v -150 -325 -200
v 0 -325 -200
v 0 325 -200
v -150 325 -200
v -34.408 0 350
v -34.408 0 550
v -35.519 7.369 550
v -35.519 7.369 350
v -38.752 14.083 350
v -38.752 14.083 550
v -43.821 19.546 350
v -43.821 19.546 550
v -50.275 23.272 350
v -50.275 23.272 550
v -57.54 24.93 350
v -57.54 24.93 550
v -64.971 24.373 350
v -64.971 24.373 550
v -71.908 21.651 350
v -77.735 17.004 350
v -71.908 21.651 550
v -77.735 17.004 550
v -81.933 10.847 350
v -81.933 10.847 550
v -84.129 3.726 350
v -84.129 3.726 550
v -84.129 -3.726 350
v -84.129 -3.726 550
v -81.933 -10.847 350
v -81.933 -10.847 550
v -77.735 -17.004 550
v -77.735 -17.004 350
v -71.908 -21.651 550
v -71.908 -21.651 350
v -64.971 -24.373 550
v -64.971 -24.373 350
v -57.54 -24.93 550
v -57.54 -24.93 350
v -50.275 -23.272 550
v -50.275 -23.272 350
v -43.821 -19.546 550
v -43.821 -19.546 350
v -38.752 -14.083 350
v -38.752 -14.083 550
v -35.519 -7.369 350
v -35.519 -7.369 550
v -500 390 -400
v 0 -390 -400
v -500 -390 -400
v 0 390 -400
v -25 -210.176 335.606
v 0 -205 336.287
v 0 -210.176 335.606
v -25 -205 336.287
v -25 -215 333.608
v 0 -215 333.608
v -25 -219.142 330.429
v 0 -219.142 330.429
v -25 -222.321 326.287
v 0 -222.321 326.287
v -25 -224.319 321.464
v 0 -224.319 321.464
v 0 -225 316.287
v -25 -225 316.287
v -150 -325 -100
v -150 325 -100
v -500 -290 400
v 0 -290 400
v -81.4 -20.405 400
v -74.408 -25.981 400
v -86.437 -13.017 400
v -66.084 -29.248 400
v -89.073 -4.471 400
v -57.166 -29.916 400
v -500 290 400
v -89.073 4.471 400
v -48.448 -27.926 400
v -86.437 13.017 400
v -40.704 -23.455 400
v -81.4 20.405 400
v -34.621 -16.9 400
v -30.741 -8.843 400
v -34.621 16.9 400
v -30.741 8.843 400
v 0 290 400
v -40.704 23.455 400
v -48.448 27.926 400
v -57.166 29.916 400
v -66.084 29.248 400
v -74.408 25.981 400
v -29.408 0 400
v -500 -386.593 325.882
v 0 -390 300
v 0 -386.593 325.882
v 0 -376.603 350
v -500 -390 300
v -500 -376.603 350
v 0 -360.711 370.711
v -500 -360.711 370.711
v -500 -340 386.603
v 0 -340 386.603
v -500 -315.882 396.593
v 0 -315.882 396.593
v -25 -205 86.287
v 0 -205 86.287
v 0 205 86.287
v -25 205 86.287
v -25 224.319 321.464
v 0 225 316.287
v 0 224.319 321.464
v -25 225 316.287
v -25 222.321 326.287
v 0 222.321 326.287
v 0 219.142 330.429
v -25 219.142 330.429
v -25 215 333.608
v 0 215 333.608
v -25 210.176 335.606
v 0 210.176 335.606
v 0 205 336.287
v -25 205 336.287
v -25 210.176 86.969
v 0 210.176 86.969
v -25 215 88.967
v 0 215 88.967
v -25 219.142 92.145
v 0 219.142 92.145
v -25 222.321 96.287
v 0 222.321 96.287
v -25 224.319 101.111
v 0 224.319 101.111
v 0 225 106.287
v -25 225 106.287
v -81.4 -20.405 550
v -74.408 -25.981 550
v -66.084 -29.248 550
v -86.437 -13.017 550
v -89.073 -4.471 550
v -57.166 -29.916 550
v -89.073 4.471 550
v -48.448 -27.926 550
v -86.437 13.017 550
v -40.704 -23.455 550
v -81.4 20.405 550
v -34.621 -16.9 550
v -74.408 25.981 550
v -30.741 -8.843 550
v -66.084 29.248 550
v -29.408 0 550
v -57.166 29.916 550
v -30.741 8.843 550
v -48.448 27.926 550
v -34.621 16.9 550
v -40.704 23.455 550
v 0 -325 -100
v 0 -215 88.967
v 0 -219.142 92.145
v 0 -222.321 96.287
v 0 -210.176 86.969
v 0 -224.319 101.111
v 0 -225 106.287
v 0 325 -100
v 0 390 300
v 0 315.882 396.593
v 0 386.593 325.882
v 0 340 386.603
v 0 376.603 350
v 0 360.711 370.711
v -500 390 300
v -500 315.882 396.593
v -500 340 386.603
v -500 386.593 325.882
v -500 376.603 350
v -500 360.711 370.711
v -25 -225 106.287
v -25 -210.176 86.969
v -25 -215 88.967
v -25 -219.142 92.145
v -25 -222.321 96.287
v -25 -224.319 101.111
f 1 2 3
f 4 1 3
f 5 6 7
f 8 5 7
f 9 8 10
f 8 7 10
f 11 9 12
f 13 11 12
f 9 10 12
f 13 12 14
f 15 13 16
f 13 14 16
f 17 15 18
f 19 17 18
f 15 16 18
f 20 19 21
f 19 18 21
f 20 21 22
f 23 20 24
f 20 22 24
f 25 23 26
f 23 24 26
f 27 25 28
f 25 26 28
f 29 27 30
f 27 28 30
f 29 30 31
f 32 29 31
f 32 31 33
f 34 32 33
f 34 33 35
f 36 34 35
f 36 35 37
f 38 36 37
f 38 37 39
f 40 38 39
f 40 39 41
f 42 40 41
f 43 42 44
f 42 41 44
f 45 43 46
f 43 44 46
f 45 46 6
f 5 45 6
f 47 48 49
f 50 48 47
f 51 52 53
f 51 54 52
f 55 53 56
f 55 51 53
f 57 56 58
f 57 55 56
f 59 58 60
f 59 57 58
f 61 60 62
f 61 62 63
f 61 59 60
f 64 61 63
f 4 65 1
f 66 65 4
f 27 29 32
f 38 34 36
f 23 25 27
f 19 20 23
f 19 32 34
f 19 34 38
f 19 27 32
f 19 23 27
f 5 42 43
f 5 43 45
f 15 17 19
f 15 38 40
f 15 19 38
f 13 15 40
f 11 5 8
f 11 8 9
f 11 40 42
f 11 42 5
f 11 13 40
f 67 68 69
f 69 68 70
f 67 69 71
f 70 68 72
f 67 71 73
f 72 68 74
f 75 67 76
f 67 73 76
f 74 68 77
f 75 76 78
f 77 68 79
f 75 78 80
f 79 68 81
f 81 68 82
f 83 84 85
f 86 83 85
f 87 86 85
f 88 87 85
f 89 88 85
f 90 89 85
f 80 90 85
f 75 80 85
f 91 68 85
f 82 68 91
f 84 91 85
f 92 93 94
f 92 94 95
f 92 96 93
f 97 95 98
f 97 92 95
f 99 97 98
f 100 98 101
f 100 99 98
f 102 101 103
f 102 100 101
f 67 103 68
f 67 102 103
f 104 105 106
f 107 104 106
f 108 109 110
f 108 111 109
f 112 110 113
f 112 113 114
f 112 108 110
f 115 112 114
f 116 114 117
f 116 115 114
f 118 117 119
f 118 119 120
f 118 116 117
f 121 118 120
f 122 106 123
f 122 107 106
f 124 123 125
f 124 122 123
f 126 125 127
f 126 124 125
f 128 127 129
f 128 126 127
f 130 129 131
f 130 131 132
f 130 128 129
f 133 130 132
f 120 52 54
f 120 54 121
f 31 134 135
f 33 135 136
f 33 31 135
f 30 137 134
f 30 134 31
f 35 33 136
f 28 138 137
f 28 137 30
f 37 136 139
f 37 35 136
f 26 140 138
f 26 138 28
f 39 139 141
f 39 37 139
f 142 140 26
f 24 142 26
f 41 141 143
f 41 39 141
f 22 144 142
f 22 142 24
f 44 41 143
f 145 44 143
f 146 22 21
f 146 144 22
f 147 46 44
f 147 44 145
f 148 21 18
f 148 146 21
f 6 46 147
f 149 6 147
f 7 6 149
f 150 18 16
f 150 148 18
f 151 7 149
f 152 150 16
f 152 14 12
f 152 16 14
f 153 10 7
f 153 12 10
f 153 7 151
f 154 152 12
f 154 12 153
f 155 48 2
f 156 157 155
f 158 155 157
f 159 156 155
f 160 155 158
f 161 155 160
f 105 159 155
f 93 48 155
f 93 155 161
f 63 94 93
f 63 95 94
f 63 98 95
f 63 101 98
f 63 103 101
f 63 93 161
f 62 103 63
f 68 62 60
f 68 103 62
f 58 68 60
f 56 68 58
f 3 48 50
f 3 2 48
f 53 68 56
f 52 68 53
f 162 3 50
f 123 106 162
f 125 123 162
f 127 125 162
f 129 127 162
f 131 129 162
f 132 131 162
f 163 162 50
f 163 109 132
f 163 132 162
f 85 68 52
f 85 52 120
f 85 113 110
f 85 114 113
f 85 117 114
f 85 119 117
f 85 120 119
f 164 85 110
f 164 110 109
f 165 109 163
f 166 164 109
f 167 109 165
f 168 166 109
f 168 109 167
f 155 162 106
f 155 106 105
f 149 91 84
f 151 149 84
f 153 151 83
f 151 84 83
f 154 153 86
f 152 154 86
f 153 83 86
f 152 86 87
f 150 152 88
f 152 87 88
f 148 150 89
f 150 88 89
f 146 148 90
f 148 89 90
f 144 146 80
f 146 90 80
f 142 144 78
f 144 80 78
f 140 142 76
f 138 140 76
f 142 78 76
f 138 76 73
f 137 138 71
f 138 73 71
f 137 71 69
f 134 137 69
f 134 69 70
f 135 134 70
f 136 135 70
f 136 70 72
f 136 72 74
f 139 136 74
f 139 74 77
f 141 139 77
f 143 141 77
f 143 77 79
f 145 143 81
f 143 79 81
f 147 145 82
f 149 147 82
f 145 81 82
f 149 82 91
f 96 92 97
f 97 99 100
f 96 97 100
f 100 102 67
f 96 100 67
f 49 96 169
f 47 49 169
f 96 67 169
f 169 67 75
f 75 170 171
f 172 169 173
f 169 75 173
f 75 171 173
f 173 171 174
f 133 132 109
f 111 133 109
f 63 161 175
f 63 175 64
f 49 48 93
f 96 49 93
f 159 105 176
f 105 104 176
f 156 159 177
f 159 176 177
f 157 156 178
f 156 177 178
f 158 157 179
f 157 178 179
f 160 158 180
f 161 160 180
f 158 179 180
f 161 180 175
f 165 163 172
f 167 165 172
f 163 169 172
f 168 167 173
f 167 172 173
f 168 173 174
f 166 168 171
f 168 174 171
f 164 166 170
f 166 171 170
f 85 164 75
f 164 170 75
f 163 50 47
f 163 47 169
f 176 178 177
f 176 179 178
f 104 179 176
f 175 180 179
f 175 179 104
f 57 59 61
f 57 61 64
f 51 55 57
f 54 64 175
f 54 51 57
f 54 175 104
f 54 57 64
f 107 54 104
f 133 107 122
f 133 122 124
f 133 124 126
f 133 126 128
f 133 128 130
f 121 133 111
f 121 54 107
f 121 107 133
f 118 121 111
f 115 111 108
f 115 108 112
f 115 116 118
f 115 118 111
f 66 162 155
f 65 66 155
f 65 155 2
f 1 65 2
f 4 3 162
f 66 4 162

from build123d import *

# Parameters (mm, degrees)
F0_W      = 780
F0_H      = 800
F1_DEPTH  = 500
F2_R      = 100
F3_R      = 30
F4_DEPTH  = 150
F5_R      = 25
F6_DEPTH  = 200
F7_W      = 450
F7_H      = 250
F8_DEPTH  = 25
F9_R      = 20
F11_DEPTH = 150


with BuildPart() as f1:
    # F0 (on Right) → F1 (new body)
    with BuildSketch(Plane.YZ):
        Rectangle(F0_W, F0_H)
    extrude(amount=-F1_DEPTH)

    # F2
    f2_edges = [f1.edges().sort_by_distance(p)[0] for p in [
        (-250, -390, 400),
        (-250, 390, 400),
    ]]
    fillet(f2_edges, radius=F2_R)

    # F3 (on face) → F4 (join)
    with BuildSketch(Plane.XY.offset(400)):
        with Locations((-59.408359, 0)):
            Circle(F3_R)
    extrude(amount=F4_DEPTH)

    # F5 (on face) → F6 (cut)
    with BuildSketch(Plane.XY.offset(550)):
        with Locations((-59.408359, 0)):
            Circle(F5_R)
    extrude(amount=-F6_DEPTH, mode=Mode.SUBTRACT)

    # F7 (on face) → F8 (cut)
    with BuildSketch(Plane.YZ):
        with Locations((0, 211.28722)):
            Rectangle(F7_W, F7_H)
    extrude(amount=-F8_DEPTH, mode=Mode.SUBTRACT)

    # F9
    f9_edges = [f1.edges().sort_by_distance(p)[0] for p in [
        (-12.5, -225, 336.28722),
        (-12.5, 225, 336.28722),
        (-12.5, -225, 86.28722),
        (-12.5, 225, 86.28722),
    ]]
    fillet(f9_edges, radius=F9_R)

    # F10 (on face) → F11 (cut)
    with BuildSketch(Plane.YZ):
        Polygon((0, -200), (325, -200), (325, -100), (-325, -100), (-325, -200), align=None)
    extrude(amount=-F11_DEPTH, mode=Mode.SUBTRACT)


solid = f1.part
